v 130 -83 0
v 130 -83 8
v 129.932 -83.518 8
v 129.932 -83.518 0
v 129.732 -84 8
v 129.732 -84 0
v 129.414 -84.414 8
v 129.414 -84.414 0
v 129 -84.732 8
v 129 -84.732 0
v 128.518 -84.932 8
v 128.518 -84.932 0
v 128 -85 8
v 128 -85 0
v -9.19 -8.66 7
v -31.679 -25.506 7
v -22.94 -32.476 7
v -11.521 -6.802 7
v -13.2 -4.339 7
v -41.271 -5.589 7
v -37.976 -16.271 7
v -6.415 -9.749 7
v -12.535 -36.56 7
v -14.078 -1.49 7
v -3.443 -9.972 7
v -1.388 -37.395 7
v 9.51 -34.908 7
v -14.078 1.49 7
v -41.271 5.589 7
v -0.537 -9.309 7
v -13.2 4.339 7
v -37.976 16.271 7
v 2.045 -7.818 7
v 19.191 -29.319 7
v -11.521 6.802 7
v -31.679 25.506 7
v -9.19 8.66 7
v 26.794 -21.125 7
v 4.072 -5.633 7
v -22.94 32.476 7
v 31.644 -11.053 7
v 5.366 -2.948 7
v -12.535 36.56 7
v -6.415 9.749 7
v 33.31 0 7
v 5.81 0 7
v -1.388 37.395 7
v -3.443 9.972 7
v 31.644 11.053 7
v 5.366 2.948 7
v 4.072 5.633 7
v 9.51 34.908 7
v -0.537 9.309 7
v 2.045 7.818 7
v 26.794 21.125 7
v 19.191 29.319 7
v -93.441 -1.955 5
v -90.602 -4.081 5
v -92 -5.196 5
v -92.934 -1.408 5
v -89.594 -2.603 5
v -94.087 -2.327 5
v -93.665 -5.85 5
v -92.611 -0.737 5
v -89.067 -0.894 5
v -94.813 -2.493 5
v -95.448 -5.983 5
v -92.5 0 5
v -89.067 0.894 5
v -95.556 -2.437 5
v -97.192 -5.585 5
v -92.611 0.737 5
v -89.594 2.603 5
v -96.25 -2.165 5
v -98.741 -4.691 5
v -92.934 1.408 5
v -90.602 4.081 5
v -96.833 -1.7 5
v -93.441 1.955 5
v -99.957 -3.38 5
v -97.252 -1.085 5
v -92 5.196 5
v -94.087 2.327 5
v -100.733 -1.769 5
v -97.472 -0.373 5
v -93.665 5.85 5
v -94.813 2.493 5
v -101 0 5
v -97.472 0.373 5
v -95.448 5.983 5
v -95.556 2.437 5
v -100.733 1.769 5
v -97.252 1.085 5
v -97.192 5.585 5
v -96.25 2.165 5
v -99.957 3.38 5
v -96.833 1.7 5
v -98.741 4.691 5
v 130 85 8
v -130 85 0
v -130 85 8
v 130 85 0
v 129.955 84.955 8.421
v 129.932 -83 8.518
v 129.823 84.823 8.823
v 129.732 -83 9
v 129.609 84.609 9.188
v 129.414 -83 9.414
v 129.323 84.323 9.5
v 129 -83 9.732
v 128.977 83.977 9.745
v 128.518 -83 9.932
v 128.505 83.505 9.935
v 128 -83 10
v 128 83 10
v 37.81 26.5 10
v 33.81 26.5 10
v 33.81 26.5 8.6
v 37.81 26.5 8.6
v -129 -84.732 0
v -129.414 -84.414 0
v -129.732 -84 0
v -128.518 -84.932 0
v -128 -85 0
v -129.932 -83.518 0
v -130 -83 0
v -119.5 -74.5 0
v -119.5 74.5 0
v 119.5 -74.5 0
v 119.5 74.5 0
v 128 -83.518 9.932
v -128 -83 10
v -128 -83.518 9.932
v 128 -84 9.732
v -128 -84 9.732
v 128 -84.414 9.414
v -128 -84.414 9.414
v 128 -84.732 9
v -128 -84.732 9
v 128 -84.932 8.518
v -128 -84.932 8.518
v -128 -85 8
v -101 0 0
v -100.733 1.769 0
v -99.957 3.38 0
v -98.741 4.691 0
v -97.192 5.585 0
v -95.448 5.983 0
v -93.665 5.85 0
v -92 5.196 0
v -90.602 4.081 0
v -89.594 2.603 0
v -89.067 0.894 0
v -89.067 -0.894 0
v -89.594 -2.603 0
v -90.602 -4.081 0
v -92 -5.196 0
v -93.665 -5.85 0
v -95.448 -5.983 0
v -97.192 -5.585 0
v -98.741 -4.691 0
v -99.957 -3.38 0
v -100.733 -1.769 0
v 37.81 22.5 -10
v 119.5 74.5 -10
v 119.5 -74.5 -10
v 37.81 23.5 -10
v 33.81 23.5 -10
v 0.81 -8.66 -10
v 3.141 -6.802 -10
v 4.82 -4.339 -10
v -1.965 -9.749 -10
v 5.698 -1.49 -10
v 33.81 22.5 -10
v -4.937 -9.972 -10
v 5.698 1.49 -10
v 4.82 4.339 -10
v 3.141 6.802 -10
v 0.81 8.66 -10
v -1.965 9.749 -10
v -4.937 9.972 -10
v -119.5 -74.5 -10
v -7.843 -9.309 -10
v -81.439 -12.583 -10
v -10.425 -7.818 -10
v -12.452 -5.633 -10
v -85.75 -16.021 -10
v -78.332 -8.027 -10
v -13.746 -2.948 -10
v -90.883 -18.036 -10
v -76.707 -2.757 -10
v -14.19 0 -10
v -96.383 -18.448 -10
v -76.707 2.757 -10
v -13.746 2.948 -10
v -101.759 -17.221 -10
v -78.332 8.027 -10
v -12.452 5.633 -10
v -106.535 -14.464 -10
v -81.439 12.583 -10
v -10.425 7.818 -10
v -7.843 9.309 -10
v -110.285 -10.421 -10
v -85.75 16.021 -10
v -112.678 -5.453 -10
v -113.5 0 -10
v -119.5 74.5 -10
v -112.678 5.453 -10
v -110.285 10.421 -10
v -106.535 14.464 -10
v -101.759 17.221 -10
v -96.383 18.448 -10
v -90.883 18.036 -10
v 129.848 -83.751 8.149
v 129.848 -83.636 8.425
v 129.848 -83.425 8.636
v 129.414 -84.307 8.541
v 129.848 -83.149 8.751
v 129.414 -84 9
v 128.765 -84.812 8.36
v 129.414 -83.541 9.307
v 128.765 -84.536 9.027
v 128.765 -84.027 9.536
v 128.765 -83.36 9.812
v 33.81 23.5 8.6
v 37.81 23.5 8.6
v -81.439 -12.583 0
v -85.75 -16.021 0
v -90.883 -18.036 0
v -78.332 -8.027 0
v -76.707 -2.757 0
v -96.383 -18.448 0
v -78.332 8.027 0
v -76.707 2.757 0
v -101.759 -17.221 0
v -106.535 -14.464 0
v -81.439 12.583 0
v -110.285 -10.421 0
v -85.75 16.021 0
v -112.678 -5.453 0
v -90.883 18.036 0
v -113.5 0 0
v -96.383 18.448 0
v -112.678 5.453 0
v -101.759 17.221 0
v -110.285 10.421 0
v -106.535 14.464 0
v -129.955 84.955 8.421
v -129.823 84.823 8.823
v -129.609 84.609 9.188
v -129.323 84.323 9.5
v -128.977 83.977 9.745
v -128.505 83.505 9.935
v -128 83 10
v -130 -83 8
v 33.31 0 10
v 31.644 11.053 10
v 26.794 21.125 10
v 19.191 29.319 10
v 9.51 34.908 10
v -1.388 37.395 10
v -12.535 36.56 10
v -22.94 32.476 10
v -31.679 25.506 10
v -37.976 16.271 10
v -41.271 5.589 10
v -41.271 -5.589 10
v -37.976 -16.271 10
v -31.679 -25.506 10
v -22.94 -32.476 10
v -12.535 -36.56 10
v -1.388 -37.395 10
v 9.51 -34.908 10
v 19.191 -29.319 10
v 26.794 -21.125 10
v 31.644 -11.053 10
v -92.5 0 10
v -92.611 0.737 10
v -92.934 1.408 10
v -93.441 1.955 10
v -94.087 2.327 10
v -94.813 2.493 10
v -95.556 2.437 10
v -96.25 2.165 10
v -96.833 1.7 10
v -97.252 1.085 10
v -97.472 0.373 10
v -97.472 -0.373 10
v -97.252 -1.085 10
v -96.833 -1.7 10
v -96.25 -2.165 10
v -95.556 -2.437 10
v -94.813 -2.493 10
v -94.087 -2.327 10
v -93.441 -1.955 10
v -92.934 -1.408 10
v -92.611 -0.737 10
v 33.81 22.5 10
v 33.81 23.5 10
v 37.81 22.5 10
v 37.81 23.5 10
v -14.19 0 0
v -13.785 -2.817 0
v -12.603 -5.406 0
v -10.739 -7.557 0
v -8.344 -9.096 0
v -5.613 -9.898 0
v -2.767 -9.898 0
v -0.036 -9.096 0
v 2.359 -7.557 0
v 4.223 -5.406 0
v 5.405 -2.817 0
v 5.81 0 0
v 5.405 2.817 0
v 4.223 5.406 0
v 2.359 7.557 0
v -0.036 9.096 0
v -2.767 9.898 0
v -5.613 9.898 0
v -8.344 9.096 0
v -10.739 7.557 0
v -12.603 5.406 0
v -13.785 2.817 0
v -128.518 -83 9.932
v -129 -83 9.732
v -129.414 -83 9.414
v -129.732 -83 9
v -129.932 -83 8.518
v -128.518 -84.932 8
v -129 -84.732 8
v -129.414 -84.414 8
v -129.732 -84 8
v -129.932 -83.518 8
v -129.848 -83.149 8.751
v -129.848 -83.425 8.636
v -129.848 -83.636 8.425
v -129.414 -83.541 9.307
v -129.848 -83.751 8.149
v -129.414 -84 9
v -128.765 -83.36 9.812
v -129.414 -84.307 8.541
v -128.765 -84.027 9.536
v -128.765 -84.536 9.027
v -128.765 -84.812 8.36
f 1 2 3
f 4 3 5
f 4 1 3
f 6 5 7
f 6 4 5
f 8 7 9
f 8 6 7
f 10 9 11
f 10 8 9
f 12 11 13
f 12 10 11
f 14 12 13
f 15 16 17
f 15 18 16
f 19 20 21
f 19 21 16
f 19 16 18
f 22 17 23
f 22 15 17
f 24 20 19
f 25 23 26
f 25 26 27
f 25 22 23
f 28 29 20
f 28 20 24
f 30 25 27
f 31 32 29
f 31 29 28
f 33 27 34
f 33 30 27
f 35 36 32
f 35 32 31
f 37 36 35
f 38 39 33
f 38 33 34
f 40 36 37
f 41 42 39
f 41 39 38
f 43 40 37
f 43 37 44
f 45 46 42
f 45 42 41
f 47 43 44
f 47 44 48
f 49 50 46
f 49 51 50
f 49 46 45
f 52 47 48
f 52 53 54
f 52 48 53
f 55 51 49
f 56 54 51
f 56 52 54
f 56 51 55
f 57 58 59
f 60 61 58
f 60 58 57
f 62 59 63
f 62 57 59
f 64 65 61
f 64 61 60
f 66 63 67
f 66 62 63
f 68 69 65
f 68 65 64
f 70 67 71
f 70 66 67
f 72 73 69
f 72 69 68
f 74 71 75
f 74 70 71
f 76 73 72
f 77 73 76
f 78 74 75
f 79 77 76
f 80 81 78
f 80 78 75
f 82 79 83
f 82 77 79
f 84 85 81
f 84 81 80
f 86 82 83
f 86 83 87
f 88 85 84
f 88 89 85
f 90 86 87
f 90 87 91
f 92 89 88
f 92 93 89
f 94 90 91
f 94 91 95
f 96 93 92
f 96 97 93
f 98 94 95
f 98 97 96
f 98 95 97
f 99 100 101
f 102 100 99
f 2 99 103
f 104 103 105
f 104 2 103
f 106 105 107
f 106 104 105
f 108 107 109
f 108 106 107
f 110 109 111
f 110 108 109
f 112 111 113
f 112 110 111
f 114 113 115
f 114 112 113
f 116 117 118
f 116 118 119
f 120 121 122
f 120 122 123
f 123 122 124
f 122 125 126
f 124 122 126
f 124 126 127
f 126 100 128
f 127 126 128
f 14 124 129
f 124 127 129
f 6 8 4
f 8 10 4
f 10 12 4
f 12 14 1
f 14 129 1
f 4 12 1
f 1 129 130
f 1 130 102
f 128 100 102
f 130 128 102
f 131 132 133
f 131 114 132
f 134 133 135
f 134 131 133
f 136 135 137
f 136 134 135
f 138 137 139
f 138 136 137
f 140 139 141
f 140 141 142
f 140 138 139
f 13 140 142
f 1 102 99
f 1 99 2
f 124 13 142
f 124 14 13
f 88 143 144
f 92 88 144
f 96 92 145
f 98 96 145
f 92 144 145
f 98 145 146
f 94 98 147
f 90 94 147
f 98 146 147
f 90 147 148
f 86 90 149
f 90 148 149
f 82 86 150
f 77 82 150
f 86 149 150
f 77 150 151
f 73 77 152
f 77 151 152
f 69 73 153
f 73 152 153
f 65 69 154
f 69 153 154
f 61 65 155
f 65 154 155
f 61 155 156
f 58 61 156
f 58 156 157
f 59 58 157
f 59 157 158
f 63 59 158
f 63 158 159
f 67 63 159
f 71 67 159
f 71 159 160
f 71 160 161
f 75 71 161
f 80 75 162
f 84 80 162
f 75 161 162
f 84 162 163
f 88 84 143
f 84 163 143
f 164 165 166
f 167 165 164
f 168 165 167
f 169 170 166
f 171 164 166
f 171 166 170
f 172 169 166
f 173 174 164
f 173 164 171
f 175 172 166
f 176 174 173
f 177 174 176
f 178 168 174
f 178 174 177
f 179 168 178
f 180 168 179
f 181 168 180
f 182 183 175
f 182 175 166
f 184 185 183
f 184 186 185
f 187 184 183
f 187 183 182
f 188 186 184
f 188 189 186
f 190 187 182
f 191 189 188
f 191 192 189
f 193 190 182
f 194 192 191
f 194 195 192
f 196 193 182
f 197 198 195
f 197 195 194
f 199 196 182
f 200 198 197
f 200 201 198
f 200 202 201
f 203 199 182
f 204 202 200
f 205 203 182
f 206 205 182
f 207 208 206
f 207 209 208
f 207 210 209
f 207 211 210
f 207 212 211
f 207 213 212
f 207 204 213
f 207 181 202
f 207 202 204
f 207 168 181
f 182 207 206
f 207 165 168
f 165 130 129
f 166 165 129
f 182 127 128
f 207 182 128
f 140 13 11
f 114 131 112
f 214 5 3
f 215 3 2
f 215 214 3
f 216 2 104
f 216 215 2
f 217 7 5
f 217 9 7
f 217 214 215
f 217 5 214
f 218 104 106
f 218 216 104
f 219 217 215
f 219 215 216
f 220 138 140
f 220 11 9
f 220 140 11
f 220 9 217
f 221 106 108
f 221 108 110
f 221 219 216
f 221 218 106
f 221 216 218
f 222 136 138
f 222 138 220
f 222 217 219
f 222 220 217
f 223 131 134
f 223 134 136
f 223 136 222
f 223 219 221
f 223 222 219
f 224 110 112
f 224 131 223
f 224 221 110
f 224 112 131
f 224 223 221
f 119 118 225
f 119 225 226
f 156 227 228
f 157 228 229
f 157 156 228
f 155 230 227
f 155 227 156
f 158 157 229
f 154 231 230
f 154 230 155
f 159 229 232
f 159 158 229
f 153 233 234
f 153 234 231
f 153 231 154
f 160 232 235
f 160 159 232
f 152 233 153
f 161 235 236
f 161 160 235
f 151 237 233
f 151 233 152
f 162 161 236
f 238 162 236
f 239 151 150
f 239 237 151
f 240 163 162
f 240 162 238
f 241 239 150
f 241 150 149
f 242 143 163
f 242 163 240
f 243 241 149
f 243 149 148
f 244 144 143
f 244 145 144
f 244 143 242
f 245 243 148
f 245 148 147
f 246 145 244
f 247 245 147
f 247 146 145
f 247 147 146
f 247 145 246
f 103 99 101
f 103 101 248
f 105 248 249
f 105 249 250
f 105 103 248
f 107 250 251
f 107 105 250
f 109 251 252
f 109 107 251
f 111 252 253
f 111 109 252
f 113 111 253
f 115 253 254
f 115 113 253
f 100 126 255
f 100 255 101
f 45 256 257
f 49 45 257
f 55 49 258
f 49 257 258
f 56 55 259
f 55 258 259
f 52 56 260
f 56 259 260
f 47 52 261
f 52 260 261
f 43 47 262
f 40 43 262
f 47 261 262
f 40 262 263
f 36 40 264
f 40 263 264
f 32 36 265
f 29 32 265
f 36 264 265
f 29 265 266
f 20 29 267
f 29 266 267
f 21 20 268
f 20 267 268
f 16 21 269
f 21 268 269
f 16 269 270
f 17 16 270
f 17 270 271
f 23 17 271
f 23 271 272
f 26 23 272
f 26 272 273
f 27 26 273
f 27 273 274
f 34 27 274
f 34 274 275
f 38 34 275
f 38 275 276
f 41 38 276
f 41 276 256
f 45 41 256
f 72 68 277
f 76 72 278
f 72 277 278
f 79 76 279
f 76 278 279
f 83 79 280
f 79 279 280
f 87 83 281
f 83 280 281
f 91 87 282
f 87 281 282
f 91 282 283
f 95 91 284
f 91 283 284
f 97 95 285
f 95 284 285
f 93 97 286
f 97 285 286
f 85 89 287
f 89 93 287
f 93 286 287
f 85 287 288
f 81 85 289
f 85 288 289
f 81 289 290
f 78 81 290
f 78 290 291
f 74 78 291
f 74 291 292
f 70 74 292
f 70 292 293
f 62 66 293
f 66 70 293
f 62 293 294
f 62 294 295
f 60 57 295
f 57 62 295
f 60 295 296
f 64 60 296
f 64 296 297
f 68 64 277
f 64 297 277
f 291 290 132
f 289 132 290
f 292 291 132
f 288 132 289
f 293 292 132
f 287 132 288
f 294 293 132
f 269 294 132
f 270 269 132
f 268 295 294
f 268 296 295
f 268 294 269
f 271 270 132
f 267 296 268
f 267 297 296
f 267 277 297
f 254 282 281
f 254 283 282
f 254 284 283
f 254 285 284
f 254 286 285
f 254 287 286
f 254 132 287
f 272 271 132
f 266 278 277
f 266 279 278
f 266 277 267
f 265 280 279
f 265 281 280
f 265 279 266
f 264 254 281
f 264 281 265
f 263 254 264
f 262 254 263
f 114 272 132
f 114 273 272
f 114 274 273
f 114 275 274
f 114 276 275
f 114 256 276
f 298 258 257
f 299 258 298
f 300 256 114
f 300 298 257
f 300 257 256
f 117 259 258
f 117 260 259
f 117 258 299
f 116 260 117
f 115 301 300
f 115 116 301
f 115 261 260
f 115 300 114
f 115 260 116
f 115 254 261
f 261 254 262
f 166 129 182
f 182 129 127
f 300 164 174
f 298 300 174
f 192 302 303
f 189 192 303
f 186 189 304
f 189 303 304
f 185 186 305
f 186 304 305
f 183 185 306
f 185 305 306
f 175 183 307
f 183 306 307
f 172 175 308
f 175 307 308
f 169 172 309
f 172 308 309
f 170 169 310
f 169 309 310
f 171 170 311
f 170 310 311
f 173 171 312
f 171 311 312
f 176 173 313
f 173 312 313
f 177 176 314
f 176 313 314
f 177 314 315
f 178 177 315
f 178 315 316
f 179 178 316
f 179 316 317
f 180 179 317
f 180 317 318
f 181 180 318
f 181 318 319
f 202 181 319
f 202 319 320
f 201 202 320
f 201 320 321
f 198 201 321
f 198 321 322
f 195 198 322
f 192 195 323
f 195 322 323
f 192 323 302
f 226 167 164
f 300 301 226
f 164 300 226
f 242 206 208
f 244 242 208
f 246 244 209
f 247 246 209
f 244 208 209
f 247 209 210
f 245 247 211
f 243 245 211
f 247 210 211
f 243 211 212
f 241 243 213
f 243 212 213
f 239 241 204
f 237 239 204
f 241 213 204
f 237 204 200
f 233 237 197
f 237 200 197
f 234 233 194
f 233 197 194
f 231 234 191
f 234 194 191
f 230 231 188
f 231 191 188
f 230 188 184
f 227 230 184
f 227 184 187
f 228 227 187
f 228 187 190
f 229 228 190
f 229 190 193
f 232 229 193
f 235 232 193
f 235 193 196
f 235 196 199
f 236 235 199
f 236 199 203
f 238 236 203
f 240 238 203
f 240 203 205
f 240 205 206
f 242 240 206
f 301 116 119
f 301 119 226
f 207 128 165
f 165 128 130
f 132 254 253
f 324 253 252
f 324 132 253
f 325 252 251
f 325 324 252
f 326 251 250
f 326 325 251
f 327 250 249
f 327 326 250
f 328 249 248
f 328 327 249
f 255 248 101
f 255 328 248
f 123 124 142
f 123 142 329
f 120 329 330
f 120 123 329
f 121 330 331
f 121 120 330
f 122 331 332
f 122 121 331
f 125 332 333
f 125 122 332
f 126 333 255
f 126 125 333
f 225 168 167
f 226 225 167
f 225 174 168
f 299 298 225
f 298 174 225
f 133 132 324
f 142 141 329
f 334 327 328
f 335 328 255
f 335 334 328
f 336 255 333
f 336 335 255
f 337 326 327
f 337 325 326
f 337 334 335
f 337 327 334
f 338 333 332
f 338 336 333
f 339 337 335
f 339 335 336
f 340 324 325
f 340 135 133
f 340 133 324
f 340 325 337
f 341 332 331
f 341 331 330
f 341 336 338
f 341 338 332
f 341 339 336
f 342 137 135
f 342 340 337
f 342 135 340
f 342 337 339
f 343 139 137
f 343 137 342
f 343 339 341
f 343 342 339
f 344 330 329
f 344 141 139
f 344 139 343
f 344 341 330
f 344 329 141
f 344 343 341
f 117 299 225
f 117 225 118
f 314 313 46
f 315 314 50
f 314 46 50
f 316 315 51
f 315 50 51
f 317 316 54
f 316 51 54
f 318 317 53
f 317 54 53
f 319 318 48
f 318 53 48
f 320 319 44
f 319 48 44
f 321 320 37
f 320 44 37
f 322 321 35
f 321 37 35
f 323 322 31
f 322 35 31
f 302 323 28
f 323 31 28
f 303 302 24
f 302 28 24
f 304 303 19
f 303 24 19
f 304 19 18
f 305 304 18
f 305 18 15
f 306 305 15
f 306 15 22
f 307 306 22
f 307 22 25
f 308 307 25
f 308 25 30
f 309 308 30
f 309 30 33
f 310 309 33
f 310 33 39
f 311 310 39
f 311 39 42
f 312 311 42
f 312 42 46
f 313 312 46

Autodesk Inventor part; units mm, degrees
ref_plane "YZ Plane" through (0, 0, 0) normal (1, 0, 0) x (0, 1, 0)
ref_plane "XZ Plane" through (0, 0, 0) normal (0, 1, 0) x (-1, 0, 0)
ref_plane "XY Plane" through (0, 0, 0) normal (0, 0, 1) x (1, 0, 0)
sketch "Boceto2" plane through (0, 0, 0) normal (0, 0, 1) x (1, 0, 0)
  line L0 (130, -85) -> (-130, -85)
  line L1 (-130, -85) -> (-130, 85)
  line L2 (-130, 85) -> (130, 85)
  line L3 (130, 85) -> (130, -85)
  line L4 (130, -85) -> (-130, 85) construction
  line L5 (-130, -85) -> (130, 85) construction
  point P0 (0, 0)
  dimension "d0" = 260
  dimension "d1" = 170
extrude "Extrusión1" add sketch "Boceto2" along normal blind 10
sketch "Boceto3" plane through (0, 0, 10) normal (0, 0, 1) x (1, 0, 0)
  line L0 (-95, 0) -> (-4.19, 0) construction
  circle A0 centre (-95, 0) radius 2.5
  circle A1 centre (-4.19, 0) radius 10
  line L1 (-130, 85) -> (-130, -85) projected
  line L2 (130, -85) -> (130, 85) projected
  line L3 (-130, -85) -> (130, -85) projected
  line L4 (130, 0) -> (80, 0) construction
  line L5 (80, 0) -> (80, -23.2237) construction
  point P0 (0, 0)
  point P1 (-130, 0)
  dimension "d7" = 5
  dimension "d8" = 20
  dimension "d14" = 85
  dimension "d29" = 50
  dimension "d30" = 90.81
  dimension "d31" = 35
  dimension "d32" = 134.19
extrude "Extrusión2" cut sketch "Boceto3" against normal through all
sketch "Boceto5" plane through (0, 0, 0) normal (0, 0, -1) x (-1, 0, 0)
  line L0 (-130, -85) -> (-130, 85) projected
  line L1 (130, -85) -> (-130, -85)
  line L2 (-130, -85) -> (-130, 85)
  line L3 (-130, 85) -> (130, 85)
  line L4 (130, 85) -> (130, -85)
  line L5 (130, -85) -> (-130, 85) construction
  line L6 (-130, -85) -> (130, 85) construction
  line L7 (119.5, 74.5) -> (-119.5, 74.5)
  line L8 (-119.5, 74.5) -> (-119.5, -74.5)
  line L9 (-119.5, -74.5) -> (119.5, -74.5)
  line L10 (119.5, -74.5) -> (119.5, 74.5)
  circle A0 centre (4.19, 0) radius 10 projected
  circle A1 centre (4.19, 0) radius 20
  circle A2 centre (95, 0) radius 2.5 projected
  circle A3 centre (95, 0) radius 2.5
  point P0 (0, 0)
  dimension "d23" = 10.5
  dimension "d24" = 40
  dimension "d25" = 5
extrude "Extrusión4" add sketch "Boceto5" along normal blind 10 contours L10 L9 L8 L7 | A1
fillet "Empalme1" radius 2 1 edges at (0, -85, 10)
fillet "Empalme2" radius 2 7 edges at (0, 85, 10) (-130, -84.4142, 9.4142) (-130, -85, 4) (-130, 1, 10) (130, -84.4142, 9.4142) (130, -85, 4) (130, 1, 10)
sketch "Boceto6" plane through (0, 0, 10) normal (0, 0, 1) x (1, 0, 0)
  circle A0 centre (-4.19, 0) radius 10 projected
  line L0 (-4.19, 0) -> (35.81, 0)
  line L1 (35.81, 0) -> (35.81, 25)
  line L2 (37.81, 23.5) -> (33.81, 23.5)
  line L3 (33.81, 23.5) -> (33.81, 26.5)
  line L4 (33.81, 26.5) -> (37.81, 26.5)
  line L5 (37.81, 26.5) -> (37.81, 23.5)
  line L6 (37.81, 23.5) -> (33.81, 26.5) construction
  line L7 (33.81, 23.5) -> (37.81, 26.5) construction
  point P0 (0, 0)
  dimension "d35" = 40
  dimension "d36" = 25
  dimension "d38" = 4
  dimension "d39" = 3
extrude "Extrusión5" cut sketch "Boceto6" against normal blind 1.4 contours L2 L3 L4 L5
sketch "Boceto8" plane through (0, 0, 10) normal (0, 0, 1) x (1, 0, 0)
  line L0 (33.81, 23.5) -> (33.81, 26.5) projected
  line L1 (33.81, 23.5) -> (37.81, 23.5)
  line L2 (37.81, 23.5) -> (37.81, 22.5)
  line L3 (37.81, 22.5) -> (33.81, 22.5)
  line L4 (33.81, 22.5) -> (33.81, 23.5)
  point P0 (0, 0)
  dimension "d42" = 4
  dimension "d43" = 1
extrude "Extrusión6" cut sketch "Boceto8" against normal through all
sketch "Boceto9" plane through (0, 0, 10) normal (0, 0, 1) x (1, 0, 0)
  circle A0 centre (-4.19, 0) radius 10 projected
  circle A1 centre (-4.19, 0) radius 37.5
  circle A2 centre (-4.19, 0) radius 10
  point P0 (0, 0)
  dimension "d47" = 75
extrude "Extrusión7" cut sketch "Boceto9" against normal blind 3
sketch "Boceto10" plane through (0, 0, -10) normal (0, 0, -1) x (-1, 0, 0)
  circle A0 centre (95, 0) radius 2.5 projected
  circle A1 centre (95, 0) radius 18.5
  circle A2 centre (95, 0) radius 6
  point P0 (0, 0)
  dimension "d50" = 37
  dimension "d51" = 12
extrude "Extrusión8" cut sketch "Boceto10" against normal blind 10 contours A1 | A2
sketch "Boceto11" plane through (-95, 0, 0) normal (0, 0, -1) x (-1, 0, 0)
  circle A0 centre (0, 0) radius 2.5 projected
  circle A1 centre (0, 0) radius 6
  point P0 (-95, 0)
  dimension "d54" = 12
extrude "Extrusión9" cut sketch "Boceto11" against normal blind 5
properties part number "Lid"
